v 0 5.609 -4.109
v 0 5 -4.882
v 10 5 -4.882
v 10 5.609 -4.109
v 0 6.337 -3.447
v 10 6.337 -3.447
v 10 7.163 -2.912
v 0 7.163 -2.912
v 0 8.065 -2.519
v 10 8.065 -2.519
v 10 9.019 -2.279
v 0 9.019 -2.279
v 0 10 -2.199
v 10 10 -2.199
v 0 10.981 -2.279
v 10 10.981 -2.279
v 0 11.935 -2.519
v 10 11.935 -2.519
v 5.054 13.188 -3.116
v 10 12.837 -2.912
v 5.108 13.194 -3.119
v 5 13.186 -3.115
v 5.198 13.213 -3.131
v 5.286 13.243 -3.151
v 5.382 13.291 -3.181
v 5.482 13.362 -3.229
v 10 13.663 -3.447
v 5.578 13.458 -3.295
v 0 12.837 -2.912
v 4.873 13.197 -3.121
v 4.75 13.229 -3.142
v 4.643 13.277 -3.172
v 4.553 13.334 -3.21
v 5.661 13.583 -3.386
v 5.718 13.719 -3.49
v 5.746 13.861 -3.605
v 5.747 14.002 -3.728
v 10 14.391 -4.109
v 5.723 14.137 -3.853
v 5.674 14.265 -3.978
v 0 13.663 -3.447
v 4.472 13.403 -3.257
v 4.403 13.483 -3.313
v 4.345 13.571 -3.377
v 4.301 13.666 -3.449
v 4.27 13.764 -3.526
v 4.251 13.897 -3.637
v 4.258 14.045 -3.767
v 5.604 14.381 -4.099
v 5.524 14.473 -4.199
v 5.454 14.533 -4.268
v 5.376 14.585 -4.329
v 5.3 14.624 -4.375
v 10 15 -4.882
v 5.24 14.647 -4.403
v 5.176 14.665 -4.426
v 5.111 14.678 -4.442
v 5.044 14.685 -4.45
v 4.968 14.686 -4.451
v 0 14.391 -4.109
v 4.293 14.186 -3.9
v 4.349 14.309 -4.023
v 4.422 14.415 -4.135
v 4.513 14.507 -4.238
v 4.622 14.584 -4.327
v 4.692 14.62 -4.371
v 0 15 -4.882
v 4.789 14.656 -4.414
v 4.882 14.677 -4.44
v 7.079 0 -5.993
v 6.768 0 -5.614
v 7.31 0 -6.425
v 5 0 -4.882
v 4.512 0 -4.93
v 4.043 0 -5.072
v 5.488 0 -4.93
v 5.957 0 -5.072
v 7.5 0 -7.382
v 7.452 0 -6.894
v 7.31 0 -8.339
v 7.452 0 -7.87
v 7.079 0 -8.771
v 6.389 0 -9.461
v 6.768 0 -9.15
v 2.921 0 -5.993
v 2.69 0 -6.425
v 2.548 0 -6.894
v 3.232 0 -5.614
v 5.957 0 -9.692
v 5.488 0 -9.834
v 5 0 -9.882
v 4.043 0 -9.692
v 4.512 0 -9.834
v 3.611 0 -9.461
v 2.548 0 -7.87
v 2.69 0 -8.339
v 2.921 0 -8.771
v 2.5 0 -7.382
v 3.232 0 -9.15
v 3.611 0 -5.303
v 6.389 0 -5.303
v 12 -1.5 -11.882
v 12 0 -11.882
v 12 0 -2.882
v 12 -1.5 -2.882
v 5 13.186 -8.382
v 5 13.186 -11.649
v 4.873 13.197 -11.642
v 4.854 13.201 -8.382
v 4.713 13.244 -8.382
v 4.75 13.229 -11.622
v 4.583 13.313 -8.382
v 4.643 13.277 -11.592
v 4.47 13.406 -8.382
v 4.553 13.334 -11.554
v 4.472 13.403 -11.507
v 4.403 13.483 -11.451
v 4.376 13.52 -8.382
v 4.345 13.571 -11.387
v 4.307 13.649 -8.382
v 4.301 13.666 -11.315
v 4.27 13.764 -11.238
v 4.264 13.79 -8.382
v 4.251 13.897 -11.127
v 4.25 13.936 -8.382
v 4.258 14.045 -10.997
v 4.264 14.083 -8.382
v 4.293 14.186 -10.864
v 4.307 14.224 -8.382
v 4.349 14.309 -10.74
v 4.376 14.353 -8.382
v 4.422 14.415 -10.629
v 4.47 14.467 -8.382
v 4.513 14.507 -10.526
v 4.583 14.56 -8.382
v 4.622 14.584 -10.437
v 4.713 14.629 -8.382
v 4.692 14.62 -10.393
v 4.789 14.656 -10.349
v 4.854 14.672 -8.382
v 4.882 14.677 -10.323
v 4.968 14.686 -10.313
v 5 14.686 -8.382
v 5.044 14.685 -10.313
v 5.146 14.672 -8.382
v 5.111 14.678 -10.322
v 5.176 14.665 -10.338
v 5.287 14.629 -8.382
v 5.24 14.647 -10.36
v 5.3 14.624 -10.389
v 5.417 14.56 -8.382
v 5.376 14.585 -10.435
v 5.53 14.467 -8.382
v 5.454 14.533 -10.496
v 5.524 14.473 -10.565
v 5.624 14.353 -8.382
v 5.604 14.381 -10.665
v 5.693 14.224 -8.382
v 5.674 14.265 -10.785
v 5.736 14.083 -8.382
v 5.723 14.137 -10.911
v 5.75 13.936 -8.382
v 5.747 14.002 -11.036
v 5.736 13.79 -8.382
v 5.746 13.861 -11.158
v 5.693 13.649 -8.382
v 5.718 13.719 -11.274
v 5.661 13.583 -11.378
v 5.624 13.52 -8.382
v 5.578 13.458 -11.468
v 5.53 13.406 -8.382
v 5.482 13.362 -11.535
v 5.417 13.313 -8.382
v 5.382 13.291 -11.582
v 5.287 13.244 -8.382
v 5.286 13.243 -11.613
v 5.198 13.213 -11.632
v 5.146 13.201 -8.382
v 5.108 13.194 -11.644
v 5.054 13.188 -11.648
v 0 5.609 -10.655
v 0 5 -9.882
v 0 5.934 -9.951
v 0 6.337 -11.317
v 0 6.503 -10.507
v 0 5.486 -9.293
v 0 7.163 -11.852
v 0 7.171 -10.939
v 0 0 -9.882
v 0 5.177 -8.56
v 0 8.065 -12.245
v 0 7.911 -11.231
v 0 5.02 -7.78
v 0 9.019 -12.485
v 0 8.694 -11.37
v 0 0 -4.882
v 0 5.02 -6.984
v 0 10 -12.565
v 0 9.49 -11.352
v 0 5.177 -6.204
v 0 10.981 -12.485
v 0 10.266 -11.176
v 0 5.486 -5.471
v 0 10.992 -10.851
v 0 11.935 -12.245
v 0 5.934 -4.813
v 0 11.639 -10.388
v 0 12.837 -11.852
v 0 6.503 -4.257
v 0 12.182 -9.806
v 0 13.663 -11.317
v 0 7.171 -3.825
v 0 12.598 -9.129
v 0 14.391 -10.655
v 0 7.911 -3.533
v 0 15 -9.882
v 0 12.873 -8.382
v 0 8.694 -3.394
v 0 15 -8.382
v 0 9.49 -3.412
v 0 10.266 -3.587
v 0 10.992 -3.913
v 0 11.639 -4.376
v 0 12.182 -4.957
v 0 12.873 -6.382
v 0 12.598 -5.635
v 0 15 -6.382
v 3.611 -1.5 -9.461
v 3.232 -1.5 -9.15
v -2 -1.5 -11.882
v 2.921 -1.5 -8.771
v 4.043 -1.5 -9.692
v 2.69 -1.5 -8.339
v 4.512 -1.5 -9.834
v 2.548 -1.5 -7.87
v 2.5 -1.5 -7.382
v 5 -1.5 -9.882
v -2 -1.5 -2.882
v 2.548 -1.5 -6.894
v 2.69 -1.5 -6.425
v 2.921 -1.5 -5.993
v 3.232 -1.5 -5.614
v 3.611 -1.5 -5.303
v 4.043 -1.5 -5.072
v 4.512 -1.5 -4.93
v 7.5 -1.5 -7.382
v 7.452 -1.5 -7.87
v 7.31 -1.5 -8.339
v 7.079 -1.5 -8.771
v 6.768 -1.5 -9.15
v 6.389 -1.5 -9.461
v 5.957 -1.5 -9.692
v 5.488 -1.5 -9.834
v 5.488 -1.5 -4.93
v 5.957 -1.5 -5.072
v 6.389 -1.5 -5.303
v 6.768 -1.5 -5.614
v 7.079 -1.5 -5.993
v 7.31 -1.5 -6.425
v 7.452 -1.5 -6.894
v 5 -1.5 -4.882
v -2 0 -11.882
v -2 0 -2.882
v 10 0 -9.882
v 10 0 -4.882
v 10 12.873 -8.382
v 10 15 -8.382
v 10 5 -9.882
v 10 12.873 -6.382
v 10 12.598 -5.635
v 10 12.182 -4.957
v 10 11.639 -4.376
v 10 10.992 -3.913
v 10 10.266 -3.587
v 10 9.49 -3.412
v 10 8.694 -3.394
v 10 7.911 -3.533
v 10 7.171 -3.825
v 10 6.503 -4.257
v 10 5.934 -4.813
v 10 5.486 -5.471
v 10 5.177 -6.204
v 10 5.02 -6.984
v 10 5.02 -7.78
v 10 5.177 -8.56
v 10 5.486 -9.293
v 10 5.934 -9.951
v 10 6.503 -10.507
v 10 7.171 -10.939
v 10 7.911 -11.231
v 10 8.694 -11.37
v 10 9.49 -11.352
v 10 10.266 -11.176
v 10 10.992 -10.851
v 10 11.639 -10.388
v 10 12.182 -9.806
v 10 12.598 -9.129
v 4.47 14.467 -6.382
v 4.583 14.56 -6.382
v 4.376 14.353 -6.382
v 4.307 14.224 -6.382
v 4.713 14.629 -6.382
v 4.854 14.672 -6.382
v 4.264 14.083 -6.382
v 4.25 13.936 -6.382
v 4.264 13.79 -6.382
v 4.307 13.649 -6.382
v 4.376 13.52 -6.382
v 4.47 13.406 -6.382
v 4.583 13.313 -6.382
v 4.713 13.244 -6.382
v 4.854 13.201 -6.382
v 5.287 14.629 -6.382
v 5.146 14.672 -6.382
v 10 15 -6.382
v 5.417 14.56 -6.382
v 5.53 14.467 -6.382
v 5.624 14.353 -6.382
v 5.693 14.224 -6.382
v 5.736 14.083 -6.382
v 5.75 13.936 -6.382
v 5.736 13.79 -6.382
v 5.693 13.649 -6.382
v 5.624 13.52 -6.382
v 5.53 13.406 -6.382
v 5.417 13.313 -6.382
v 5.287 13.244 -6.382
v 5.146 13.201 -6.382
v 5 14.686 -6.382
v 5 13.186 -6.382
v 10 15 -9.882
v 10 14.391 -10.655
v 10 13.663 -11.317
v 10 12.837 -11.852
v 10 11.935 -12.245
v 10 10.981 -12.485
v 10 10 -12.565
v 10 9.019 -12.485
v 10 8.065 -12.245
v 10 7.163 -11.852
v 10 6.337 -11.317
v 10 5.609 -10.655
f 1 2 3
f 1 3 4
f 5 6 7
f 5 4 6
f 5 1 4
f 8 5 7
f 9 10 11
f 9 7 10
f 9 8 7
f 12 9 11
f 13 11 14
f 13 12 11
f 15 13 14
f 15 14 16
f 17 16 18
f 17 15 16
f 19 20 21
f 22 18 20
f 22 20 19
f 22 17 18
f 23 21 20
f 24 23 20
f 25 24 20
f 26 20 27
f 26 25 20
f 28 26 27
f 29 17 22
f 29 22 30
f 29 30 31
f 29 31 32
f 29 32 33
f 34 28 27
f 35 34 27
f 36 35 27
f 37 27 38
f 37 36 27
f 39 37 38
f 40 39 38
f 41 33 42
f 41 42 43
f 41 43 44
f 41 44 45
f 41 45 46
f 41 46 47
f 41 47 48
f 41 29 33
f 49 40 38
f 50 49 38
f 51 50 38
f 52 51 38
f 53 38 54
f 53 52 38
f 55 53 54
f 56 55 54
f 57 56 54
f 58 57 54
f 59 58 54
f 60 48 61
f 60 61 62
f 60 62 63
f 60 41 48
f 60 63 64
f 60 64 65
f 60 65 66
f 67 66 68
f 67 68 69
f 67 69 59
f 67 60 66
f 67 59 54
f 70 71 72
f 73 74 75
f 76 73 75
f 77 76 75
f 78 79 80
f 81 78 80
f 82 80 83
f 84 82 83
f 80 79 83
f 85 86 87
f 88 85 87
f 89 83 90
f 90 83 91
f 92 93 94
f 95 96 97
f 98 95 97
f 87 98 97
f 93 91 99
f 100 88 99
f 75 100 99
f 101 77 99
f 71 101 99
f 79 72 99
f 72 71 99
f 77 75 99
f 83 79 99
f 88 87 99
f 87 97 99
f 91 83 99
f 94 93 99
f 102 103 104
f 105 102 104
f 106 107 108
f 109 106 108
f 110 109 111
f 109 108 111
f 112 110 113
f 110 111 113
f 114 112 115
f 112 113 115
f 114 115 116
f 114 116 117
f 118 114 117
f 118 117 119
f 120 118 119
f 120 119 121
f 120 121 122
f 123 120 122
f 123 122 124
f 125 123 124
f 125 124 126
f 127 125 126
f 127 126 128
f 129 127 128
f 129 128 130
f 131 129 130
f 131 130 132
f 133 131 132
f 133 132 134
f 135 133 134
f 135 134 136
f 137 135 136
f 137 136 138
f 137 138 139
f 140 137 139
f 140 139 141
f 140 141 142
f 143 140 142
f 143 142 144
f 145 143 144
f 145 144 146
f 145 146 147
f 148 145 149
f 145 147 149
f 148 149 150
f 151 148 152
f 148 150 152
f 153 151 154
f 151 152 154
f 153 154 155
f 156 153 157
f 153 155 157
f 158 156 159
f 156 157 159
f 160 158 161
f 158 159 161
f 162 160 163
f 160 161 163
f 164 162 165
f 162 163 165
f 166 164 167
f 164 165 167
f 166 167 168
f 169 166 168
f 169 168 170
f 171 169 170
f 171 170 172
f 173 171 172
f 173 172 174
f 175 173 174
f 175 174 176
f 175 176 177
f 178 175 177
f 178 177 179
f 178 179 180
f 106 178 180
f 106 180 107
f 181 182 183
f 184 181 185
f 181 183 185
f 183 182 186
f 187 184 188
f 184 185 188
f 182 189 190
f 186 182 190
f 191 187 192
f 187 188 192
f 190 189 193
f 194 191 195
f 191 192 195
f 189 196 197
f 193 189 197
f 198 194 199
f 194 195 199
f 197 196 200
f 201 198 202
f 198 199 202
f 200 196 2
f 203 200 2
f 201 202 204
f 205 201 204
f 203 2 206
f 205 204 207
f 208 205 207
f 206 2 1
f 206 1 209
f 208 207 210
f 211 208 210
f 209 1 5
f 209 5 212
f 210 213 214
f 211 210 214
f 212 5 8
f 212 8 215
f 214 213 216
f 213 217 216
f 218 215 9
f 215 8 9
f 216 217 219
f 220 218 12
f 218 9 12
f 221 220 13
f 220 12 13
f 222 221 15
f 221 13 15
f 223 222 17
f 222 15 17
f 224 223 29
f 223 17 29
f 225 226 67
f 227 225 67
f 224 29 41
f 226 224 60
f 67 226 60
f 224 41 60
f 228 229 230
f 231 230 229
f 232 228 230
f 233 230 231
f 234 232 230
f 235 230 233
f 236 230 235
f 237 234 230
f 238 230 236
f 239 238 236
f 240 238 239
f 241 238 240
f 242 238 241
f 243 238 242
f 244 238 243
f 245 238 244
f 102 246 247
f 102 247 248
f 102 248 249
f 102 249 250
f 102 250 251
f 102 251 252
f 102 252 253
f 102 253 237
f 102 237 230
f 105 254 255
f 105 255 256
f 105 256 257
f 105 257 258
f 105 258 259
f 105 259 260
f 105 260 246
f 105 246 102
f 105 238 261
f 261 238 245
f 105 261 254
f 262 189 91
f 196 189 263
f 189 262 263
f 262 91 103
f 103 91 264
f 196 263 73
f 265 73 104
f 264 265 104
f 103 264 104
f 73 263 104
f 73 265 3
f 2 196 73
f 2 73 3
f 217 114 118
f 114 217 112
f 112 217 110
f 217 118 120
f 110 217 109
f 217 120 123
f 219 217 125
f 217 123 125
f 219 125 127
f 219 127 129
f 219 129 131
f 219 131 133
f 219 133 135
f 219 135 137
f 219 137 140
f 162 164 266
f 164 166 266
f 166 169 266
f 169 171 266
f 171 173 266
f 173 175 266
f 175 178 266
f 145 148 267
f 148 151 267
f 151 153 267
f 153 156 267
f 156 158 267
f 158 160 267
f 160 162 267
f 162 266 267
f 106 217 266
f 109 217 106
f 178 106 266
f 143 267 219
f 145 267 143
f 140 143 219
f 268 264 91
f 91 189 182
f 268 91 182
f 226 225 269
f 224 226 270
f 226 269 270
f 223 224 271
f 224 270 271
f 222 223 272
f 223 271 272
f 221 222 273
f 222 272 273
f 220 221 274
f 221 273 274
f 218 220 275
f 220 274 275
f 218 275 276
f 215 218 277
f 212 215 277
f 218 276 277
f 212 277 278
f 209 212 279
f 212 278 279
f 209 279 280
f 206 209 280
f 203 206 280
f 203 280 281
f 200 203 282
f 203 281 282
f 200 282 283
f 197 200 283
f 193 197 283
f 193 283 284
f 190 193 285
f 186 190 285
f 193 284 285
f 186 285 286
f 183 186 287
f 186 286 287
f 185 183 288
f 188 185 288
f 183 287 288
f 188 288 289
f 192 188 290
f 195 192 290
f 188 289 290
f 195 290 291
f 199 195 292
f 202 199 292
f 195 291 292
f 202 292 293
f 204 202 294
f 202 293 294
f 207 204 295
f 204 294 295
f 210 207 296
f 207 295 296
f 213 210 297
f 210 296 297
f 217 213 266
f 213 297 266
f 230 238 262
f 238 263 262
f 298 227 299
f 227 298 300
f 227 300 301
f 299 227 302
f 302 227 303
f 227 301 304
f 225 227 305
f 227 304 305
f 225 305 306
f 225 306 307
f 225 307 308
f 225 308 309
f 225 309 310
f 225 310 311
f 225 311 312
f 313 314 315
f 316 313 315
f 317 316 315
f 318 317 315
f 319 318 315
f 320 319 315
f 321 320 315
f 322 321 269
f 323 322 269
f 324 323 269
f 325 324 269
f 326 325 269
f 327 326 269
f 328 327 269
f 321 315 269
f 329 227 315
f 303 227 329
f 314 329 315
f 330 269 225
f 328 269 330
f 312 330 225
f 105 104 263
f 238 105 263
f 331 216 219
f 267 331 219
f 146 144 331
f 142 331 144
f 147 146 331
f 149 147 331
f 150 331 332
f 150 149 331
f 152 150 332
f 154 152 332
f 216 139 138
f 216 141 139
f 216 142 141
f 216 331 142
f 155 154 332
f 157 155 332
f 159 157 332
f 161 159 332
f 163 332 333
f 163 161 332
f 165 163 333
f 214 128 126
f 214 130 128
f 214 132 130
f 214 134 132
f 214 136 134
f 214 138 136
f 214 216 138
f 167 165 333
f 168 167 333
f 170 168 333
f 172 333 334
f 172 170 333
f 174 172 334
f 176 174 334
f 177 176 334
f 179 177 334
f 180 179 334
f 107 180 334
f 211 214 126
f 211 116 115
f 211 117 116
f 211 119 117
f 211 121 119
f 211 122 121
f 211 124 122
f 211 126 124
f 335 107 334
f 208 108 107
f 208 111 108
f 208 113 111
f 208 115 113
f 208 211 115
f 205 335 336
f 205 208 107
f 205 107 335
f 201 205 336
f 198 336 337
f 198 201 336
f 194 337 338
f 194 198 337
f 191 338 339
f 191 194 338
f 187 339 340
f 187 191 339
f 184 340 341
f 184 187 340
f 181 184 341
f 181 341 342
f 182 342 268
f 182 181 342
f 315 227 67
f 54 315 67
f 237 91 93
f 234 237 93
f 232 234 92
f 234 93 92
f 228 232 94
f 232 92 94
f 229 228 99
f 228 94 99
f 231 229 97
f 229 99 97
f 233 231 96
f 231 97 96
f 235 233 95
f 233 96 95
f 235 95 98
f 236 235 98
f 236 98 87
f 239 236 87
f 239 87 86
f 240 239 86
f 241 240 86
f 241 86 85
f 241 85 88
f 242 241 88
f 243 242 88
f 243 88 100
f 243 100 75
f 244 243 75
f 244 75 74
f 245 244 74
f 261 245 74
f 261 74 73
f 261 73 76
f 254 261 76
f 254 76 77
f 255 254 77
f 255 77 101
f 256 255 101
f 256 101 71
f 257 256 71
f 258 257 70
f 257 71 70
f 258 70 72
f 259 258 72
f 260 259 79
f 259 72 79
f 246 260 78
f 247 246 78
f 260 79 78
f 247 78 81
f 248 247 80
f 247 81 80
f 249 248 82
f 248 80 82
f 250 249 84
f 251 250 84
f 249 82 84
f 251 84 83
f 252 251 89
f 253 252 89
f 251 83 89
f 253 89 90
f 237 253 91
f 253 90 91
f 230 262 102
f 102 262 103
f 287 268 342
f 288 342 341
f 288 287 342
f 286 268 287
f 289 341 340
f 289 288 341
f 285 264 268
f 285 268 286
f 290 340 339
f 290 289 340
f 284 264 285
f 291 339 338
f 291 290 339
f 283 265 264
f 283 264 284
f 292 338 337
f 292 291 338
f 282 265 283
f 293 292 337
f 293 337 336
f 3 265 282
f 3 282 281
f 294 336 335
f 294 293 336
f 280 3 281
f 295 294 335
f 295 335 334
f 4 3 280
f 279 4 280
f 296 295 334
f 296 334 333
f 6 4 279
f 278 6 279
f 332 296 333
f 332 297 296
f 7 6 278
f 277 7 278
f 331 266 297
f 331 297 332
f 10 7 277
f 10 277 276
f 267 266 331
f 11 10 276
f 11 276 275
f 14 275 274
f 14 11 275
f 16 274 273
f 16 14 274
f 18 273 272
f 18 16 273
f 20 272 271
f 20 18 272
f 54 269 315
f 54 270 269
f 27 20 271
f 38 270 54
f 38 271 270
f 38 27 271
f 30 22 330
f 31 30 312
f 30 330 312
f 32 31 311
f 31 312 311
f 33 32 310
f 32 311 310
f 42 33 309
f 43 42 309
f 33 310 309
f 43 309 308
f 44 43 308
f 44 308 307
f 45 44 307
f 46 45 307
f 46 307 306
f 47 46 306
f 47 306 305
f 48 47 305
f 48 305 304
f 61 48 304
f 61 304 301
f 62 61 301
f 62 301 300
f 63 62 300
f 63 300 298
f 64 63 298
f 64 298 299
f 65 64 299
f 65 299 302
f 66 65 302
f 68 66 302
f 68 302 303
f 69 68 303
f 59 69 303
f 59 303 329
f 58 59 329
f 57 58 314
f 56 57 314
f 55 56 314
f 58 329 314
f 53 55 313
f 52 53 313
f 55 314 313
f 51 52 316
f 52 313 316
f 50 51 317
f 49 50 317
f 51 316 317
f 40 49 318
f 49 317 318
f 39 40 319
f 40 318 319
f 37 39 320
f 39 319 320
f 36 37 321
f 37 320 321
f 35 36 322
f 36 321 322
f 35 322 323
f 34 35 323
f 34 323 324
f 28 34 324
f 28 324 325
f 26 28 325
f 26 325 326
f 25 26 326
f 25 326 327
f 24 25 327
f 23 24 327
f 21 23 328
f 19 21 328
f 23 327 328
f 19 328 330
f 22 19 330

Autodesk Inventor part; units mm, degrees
ref_plane "YZ Plane" through (0, 0, 0) normal (1, 0, 0) x (0, 1, 0)
ref_plane "XZ Plane" through (0, 0, 0) normal (0, 1, 0) x (-1, 0, 0)
ref_plane "XY Plane" through (0, 0, 0) normal (0, 0, 1) x (1, 0, 0)
sketch "Sketch1" plane through (0, 0, 0) normal (1, 0, 0) x (0, 1, 0)
  line L0 (0, -4.8819) -> (5, -4.8819)
  line L1 (5, -4.8819) -> (0, -4.8819)
  line L2 (0, -4.8819) -> (0, -9.8819)
  line L3 (0, -9.8819) -> (5, -9.8819)
  arc A0 (15, -4.8819) -> (5, -4.8819) centre (10, -8.1985) ccw
  arc A1 (5, -9.8819) -> (15, -9.8819) centre (10, -6.5653) ccw
  line L4 (15, -9.8819) -> (15, -4.8819)
  point P0 (0, 0)
  point P1 (0, -7.3819)
  point P2 (10, -7.3819)
  point P3 (10, -4.8819)
  point P4 (10, -9.8819)
  dimension "d0" = 5
  dimension "d1" = 10
  dimension "d2" = 5
  dimension "d3" = 5
  dimension "d4" = 10
  dimension "d5" = 6
  dimension "d6" = 6
extrude "Extrusion1" add sketch "Sketch1" along normal blind 10
sketch "Sketch7" plane through (10, 0, 0) normal (1, 0, 0) x (0, 0, -1)
  line L0 (9.8819, 15) -> (4.8819, 15) projected
  line L1 (9.8819, 0) -> (9.8819, 5) projected
  line L2 (4.8819, 0) -> (9.8819, 0) projected
  circle A0 centre (7.3819, 9) radius 4
  point P0 (0, 0)
  point P1 (7.3819, 15)
  point P2 (7.3819, 5)
  point P3 (9.8819, 10.0351)
  dimension "d29" = 2.5
  dimension "d30" = 10
  dimension "d31" = 4
  dimension "d33" = 5
extrude "Extrusion4" cut sketch "Sketch7" against normal blind 10
sketch "Sketch8" plane through (10, 0, 0) normal (1, 0, 0) x (0, 0, -1)
  line L0 (8.3819, 12.873) -> (8.3819, 15)
  line L1 (9.8819, 15) -> (4.8819, 15) projected
  line L2 (9.8819, 15) -> (4.8819, 15) projected
  line L3 (6.3819, 15) -> (6.3819, 12.873)
  circle A0 centre (7.3819, 9) radius 4 projected
  line L4 (8.3819, 15) -> (6.3819, 15)
  arc A1 (8.3819, 12.873) -> (6.3819, 12.873) centre (7.3819, 9) ccw
  point P0 (0, 0)
  dimension "d36" = 1.5
  dimension "d39" = 1.5
extrude "Extrusion5" cut sketch "Sketch8" against normal blind 10 contours A0 L3 L1 L0
sketch "Sketch9" plane through (0, 0, -9.8819) normal (0, 0, -1) x (-1, 0, 0)
  circle A0 centre (-5, 13.9365) radius 0.4
  line L0 (-10, 12.873) -> (0, 12.873) projected
  line L1 (0, 15) -> (-10, 15) projected
  line L2 (-10, 15) -> (-10, 5) projected
  point P0 (0, 0)
  dimension "d42" = 0.8
  dimension "d43" = 1.0635
  dimension "d44" = 2.127
  dimension "d45" = 10
  dimension "d46" = 5
hole "Hole1" at (5, 13.9365, -9.8819) direction (0, 0, -1) diameter 1.5 end through all both
sketch "Sketch10" plane through (0, 0, -9.8819) normal (0, -1, 0) x (1, 0, 0)
  line L0 (12, -2) -> (12, 7)
  line L1 (12, 7) -> (-2, 7)
  line L2 (0, 7.6834) -> (10, 7.6834) projected
  line L3 (-2, 7) -> (-2, -2)
  line L4 (-2, -2) -> (12, -2)
  line L5 (0, -2.6834) -> (10, -2.6834) projected
  line L6 (0, -2.6834) -> (0, 0) projected
  line L7 (0, 0) -> (10, 0) projected
  line L8 (0, 5) -> (0, 0) projected
  line L9 (0, 5) -> (10, 5) projected
  point P0 (0, 9.8819)
  point P1 (5, 2.5)
  dimension "d54" = 14
  dimension "d56" = 2
  dimension "d57" = 2
  dimension "d58" = 5
  dimension "d59" = 2.5
  dimension "d60" = 2
  dimension "d74" = 9
extrude "Extrusion6" add sketch "Sketch10" along normal blind 1.5
sketch "Sketch11" plane through (10, 0, 0) normal (1, 0, 0) x (0, 0, -1)
  point P0 (0, 0)
sketch "Sketch12" plane through (0, -1.5, -9.8819) normal (0, -1, 0) x (1, 0, 0)
  line L0 (-2, 7) -> (-2, -2) projected
  line L1 (12, 7) -> (-2, 7) projected
  circle A0 centre (5, 2.5) radius 2.5
  point P0 (0, 9.8819)
  dimension "d63" = 7
  dimension "d64" = 4.5
  dimension "d65" = 9
  dimension "d66" = 5
hole "Hole2" at (5, -1.5, -7.3819) direction (0, 1, 0) diameter 5 depth 1.5
equation "\"d2\" = d0"
equation "\"d3\" = d0"
equation "\"d36\" = d37"
equation "\"d43\" = 0.5 * d44"
equation "\"d59\" = 0.5 * d58"
equation "\"d60\" = d57"
equation "\"d64\" = 0.5 * d65"
equation "\"d66\" = hoop_bearing_length"
equation "\"hoop_bearing_length\" = 5"
equation "\"d37\" = 1.5"
properties part number "Clamp"
